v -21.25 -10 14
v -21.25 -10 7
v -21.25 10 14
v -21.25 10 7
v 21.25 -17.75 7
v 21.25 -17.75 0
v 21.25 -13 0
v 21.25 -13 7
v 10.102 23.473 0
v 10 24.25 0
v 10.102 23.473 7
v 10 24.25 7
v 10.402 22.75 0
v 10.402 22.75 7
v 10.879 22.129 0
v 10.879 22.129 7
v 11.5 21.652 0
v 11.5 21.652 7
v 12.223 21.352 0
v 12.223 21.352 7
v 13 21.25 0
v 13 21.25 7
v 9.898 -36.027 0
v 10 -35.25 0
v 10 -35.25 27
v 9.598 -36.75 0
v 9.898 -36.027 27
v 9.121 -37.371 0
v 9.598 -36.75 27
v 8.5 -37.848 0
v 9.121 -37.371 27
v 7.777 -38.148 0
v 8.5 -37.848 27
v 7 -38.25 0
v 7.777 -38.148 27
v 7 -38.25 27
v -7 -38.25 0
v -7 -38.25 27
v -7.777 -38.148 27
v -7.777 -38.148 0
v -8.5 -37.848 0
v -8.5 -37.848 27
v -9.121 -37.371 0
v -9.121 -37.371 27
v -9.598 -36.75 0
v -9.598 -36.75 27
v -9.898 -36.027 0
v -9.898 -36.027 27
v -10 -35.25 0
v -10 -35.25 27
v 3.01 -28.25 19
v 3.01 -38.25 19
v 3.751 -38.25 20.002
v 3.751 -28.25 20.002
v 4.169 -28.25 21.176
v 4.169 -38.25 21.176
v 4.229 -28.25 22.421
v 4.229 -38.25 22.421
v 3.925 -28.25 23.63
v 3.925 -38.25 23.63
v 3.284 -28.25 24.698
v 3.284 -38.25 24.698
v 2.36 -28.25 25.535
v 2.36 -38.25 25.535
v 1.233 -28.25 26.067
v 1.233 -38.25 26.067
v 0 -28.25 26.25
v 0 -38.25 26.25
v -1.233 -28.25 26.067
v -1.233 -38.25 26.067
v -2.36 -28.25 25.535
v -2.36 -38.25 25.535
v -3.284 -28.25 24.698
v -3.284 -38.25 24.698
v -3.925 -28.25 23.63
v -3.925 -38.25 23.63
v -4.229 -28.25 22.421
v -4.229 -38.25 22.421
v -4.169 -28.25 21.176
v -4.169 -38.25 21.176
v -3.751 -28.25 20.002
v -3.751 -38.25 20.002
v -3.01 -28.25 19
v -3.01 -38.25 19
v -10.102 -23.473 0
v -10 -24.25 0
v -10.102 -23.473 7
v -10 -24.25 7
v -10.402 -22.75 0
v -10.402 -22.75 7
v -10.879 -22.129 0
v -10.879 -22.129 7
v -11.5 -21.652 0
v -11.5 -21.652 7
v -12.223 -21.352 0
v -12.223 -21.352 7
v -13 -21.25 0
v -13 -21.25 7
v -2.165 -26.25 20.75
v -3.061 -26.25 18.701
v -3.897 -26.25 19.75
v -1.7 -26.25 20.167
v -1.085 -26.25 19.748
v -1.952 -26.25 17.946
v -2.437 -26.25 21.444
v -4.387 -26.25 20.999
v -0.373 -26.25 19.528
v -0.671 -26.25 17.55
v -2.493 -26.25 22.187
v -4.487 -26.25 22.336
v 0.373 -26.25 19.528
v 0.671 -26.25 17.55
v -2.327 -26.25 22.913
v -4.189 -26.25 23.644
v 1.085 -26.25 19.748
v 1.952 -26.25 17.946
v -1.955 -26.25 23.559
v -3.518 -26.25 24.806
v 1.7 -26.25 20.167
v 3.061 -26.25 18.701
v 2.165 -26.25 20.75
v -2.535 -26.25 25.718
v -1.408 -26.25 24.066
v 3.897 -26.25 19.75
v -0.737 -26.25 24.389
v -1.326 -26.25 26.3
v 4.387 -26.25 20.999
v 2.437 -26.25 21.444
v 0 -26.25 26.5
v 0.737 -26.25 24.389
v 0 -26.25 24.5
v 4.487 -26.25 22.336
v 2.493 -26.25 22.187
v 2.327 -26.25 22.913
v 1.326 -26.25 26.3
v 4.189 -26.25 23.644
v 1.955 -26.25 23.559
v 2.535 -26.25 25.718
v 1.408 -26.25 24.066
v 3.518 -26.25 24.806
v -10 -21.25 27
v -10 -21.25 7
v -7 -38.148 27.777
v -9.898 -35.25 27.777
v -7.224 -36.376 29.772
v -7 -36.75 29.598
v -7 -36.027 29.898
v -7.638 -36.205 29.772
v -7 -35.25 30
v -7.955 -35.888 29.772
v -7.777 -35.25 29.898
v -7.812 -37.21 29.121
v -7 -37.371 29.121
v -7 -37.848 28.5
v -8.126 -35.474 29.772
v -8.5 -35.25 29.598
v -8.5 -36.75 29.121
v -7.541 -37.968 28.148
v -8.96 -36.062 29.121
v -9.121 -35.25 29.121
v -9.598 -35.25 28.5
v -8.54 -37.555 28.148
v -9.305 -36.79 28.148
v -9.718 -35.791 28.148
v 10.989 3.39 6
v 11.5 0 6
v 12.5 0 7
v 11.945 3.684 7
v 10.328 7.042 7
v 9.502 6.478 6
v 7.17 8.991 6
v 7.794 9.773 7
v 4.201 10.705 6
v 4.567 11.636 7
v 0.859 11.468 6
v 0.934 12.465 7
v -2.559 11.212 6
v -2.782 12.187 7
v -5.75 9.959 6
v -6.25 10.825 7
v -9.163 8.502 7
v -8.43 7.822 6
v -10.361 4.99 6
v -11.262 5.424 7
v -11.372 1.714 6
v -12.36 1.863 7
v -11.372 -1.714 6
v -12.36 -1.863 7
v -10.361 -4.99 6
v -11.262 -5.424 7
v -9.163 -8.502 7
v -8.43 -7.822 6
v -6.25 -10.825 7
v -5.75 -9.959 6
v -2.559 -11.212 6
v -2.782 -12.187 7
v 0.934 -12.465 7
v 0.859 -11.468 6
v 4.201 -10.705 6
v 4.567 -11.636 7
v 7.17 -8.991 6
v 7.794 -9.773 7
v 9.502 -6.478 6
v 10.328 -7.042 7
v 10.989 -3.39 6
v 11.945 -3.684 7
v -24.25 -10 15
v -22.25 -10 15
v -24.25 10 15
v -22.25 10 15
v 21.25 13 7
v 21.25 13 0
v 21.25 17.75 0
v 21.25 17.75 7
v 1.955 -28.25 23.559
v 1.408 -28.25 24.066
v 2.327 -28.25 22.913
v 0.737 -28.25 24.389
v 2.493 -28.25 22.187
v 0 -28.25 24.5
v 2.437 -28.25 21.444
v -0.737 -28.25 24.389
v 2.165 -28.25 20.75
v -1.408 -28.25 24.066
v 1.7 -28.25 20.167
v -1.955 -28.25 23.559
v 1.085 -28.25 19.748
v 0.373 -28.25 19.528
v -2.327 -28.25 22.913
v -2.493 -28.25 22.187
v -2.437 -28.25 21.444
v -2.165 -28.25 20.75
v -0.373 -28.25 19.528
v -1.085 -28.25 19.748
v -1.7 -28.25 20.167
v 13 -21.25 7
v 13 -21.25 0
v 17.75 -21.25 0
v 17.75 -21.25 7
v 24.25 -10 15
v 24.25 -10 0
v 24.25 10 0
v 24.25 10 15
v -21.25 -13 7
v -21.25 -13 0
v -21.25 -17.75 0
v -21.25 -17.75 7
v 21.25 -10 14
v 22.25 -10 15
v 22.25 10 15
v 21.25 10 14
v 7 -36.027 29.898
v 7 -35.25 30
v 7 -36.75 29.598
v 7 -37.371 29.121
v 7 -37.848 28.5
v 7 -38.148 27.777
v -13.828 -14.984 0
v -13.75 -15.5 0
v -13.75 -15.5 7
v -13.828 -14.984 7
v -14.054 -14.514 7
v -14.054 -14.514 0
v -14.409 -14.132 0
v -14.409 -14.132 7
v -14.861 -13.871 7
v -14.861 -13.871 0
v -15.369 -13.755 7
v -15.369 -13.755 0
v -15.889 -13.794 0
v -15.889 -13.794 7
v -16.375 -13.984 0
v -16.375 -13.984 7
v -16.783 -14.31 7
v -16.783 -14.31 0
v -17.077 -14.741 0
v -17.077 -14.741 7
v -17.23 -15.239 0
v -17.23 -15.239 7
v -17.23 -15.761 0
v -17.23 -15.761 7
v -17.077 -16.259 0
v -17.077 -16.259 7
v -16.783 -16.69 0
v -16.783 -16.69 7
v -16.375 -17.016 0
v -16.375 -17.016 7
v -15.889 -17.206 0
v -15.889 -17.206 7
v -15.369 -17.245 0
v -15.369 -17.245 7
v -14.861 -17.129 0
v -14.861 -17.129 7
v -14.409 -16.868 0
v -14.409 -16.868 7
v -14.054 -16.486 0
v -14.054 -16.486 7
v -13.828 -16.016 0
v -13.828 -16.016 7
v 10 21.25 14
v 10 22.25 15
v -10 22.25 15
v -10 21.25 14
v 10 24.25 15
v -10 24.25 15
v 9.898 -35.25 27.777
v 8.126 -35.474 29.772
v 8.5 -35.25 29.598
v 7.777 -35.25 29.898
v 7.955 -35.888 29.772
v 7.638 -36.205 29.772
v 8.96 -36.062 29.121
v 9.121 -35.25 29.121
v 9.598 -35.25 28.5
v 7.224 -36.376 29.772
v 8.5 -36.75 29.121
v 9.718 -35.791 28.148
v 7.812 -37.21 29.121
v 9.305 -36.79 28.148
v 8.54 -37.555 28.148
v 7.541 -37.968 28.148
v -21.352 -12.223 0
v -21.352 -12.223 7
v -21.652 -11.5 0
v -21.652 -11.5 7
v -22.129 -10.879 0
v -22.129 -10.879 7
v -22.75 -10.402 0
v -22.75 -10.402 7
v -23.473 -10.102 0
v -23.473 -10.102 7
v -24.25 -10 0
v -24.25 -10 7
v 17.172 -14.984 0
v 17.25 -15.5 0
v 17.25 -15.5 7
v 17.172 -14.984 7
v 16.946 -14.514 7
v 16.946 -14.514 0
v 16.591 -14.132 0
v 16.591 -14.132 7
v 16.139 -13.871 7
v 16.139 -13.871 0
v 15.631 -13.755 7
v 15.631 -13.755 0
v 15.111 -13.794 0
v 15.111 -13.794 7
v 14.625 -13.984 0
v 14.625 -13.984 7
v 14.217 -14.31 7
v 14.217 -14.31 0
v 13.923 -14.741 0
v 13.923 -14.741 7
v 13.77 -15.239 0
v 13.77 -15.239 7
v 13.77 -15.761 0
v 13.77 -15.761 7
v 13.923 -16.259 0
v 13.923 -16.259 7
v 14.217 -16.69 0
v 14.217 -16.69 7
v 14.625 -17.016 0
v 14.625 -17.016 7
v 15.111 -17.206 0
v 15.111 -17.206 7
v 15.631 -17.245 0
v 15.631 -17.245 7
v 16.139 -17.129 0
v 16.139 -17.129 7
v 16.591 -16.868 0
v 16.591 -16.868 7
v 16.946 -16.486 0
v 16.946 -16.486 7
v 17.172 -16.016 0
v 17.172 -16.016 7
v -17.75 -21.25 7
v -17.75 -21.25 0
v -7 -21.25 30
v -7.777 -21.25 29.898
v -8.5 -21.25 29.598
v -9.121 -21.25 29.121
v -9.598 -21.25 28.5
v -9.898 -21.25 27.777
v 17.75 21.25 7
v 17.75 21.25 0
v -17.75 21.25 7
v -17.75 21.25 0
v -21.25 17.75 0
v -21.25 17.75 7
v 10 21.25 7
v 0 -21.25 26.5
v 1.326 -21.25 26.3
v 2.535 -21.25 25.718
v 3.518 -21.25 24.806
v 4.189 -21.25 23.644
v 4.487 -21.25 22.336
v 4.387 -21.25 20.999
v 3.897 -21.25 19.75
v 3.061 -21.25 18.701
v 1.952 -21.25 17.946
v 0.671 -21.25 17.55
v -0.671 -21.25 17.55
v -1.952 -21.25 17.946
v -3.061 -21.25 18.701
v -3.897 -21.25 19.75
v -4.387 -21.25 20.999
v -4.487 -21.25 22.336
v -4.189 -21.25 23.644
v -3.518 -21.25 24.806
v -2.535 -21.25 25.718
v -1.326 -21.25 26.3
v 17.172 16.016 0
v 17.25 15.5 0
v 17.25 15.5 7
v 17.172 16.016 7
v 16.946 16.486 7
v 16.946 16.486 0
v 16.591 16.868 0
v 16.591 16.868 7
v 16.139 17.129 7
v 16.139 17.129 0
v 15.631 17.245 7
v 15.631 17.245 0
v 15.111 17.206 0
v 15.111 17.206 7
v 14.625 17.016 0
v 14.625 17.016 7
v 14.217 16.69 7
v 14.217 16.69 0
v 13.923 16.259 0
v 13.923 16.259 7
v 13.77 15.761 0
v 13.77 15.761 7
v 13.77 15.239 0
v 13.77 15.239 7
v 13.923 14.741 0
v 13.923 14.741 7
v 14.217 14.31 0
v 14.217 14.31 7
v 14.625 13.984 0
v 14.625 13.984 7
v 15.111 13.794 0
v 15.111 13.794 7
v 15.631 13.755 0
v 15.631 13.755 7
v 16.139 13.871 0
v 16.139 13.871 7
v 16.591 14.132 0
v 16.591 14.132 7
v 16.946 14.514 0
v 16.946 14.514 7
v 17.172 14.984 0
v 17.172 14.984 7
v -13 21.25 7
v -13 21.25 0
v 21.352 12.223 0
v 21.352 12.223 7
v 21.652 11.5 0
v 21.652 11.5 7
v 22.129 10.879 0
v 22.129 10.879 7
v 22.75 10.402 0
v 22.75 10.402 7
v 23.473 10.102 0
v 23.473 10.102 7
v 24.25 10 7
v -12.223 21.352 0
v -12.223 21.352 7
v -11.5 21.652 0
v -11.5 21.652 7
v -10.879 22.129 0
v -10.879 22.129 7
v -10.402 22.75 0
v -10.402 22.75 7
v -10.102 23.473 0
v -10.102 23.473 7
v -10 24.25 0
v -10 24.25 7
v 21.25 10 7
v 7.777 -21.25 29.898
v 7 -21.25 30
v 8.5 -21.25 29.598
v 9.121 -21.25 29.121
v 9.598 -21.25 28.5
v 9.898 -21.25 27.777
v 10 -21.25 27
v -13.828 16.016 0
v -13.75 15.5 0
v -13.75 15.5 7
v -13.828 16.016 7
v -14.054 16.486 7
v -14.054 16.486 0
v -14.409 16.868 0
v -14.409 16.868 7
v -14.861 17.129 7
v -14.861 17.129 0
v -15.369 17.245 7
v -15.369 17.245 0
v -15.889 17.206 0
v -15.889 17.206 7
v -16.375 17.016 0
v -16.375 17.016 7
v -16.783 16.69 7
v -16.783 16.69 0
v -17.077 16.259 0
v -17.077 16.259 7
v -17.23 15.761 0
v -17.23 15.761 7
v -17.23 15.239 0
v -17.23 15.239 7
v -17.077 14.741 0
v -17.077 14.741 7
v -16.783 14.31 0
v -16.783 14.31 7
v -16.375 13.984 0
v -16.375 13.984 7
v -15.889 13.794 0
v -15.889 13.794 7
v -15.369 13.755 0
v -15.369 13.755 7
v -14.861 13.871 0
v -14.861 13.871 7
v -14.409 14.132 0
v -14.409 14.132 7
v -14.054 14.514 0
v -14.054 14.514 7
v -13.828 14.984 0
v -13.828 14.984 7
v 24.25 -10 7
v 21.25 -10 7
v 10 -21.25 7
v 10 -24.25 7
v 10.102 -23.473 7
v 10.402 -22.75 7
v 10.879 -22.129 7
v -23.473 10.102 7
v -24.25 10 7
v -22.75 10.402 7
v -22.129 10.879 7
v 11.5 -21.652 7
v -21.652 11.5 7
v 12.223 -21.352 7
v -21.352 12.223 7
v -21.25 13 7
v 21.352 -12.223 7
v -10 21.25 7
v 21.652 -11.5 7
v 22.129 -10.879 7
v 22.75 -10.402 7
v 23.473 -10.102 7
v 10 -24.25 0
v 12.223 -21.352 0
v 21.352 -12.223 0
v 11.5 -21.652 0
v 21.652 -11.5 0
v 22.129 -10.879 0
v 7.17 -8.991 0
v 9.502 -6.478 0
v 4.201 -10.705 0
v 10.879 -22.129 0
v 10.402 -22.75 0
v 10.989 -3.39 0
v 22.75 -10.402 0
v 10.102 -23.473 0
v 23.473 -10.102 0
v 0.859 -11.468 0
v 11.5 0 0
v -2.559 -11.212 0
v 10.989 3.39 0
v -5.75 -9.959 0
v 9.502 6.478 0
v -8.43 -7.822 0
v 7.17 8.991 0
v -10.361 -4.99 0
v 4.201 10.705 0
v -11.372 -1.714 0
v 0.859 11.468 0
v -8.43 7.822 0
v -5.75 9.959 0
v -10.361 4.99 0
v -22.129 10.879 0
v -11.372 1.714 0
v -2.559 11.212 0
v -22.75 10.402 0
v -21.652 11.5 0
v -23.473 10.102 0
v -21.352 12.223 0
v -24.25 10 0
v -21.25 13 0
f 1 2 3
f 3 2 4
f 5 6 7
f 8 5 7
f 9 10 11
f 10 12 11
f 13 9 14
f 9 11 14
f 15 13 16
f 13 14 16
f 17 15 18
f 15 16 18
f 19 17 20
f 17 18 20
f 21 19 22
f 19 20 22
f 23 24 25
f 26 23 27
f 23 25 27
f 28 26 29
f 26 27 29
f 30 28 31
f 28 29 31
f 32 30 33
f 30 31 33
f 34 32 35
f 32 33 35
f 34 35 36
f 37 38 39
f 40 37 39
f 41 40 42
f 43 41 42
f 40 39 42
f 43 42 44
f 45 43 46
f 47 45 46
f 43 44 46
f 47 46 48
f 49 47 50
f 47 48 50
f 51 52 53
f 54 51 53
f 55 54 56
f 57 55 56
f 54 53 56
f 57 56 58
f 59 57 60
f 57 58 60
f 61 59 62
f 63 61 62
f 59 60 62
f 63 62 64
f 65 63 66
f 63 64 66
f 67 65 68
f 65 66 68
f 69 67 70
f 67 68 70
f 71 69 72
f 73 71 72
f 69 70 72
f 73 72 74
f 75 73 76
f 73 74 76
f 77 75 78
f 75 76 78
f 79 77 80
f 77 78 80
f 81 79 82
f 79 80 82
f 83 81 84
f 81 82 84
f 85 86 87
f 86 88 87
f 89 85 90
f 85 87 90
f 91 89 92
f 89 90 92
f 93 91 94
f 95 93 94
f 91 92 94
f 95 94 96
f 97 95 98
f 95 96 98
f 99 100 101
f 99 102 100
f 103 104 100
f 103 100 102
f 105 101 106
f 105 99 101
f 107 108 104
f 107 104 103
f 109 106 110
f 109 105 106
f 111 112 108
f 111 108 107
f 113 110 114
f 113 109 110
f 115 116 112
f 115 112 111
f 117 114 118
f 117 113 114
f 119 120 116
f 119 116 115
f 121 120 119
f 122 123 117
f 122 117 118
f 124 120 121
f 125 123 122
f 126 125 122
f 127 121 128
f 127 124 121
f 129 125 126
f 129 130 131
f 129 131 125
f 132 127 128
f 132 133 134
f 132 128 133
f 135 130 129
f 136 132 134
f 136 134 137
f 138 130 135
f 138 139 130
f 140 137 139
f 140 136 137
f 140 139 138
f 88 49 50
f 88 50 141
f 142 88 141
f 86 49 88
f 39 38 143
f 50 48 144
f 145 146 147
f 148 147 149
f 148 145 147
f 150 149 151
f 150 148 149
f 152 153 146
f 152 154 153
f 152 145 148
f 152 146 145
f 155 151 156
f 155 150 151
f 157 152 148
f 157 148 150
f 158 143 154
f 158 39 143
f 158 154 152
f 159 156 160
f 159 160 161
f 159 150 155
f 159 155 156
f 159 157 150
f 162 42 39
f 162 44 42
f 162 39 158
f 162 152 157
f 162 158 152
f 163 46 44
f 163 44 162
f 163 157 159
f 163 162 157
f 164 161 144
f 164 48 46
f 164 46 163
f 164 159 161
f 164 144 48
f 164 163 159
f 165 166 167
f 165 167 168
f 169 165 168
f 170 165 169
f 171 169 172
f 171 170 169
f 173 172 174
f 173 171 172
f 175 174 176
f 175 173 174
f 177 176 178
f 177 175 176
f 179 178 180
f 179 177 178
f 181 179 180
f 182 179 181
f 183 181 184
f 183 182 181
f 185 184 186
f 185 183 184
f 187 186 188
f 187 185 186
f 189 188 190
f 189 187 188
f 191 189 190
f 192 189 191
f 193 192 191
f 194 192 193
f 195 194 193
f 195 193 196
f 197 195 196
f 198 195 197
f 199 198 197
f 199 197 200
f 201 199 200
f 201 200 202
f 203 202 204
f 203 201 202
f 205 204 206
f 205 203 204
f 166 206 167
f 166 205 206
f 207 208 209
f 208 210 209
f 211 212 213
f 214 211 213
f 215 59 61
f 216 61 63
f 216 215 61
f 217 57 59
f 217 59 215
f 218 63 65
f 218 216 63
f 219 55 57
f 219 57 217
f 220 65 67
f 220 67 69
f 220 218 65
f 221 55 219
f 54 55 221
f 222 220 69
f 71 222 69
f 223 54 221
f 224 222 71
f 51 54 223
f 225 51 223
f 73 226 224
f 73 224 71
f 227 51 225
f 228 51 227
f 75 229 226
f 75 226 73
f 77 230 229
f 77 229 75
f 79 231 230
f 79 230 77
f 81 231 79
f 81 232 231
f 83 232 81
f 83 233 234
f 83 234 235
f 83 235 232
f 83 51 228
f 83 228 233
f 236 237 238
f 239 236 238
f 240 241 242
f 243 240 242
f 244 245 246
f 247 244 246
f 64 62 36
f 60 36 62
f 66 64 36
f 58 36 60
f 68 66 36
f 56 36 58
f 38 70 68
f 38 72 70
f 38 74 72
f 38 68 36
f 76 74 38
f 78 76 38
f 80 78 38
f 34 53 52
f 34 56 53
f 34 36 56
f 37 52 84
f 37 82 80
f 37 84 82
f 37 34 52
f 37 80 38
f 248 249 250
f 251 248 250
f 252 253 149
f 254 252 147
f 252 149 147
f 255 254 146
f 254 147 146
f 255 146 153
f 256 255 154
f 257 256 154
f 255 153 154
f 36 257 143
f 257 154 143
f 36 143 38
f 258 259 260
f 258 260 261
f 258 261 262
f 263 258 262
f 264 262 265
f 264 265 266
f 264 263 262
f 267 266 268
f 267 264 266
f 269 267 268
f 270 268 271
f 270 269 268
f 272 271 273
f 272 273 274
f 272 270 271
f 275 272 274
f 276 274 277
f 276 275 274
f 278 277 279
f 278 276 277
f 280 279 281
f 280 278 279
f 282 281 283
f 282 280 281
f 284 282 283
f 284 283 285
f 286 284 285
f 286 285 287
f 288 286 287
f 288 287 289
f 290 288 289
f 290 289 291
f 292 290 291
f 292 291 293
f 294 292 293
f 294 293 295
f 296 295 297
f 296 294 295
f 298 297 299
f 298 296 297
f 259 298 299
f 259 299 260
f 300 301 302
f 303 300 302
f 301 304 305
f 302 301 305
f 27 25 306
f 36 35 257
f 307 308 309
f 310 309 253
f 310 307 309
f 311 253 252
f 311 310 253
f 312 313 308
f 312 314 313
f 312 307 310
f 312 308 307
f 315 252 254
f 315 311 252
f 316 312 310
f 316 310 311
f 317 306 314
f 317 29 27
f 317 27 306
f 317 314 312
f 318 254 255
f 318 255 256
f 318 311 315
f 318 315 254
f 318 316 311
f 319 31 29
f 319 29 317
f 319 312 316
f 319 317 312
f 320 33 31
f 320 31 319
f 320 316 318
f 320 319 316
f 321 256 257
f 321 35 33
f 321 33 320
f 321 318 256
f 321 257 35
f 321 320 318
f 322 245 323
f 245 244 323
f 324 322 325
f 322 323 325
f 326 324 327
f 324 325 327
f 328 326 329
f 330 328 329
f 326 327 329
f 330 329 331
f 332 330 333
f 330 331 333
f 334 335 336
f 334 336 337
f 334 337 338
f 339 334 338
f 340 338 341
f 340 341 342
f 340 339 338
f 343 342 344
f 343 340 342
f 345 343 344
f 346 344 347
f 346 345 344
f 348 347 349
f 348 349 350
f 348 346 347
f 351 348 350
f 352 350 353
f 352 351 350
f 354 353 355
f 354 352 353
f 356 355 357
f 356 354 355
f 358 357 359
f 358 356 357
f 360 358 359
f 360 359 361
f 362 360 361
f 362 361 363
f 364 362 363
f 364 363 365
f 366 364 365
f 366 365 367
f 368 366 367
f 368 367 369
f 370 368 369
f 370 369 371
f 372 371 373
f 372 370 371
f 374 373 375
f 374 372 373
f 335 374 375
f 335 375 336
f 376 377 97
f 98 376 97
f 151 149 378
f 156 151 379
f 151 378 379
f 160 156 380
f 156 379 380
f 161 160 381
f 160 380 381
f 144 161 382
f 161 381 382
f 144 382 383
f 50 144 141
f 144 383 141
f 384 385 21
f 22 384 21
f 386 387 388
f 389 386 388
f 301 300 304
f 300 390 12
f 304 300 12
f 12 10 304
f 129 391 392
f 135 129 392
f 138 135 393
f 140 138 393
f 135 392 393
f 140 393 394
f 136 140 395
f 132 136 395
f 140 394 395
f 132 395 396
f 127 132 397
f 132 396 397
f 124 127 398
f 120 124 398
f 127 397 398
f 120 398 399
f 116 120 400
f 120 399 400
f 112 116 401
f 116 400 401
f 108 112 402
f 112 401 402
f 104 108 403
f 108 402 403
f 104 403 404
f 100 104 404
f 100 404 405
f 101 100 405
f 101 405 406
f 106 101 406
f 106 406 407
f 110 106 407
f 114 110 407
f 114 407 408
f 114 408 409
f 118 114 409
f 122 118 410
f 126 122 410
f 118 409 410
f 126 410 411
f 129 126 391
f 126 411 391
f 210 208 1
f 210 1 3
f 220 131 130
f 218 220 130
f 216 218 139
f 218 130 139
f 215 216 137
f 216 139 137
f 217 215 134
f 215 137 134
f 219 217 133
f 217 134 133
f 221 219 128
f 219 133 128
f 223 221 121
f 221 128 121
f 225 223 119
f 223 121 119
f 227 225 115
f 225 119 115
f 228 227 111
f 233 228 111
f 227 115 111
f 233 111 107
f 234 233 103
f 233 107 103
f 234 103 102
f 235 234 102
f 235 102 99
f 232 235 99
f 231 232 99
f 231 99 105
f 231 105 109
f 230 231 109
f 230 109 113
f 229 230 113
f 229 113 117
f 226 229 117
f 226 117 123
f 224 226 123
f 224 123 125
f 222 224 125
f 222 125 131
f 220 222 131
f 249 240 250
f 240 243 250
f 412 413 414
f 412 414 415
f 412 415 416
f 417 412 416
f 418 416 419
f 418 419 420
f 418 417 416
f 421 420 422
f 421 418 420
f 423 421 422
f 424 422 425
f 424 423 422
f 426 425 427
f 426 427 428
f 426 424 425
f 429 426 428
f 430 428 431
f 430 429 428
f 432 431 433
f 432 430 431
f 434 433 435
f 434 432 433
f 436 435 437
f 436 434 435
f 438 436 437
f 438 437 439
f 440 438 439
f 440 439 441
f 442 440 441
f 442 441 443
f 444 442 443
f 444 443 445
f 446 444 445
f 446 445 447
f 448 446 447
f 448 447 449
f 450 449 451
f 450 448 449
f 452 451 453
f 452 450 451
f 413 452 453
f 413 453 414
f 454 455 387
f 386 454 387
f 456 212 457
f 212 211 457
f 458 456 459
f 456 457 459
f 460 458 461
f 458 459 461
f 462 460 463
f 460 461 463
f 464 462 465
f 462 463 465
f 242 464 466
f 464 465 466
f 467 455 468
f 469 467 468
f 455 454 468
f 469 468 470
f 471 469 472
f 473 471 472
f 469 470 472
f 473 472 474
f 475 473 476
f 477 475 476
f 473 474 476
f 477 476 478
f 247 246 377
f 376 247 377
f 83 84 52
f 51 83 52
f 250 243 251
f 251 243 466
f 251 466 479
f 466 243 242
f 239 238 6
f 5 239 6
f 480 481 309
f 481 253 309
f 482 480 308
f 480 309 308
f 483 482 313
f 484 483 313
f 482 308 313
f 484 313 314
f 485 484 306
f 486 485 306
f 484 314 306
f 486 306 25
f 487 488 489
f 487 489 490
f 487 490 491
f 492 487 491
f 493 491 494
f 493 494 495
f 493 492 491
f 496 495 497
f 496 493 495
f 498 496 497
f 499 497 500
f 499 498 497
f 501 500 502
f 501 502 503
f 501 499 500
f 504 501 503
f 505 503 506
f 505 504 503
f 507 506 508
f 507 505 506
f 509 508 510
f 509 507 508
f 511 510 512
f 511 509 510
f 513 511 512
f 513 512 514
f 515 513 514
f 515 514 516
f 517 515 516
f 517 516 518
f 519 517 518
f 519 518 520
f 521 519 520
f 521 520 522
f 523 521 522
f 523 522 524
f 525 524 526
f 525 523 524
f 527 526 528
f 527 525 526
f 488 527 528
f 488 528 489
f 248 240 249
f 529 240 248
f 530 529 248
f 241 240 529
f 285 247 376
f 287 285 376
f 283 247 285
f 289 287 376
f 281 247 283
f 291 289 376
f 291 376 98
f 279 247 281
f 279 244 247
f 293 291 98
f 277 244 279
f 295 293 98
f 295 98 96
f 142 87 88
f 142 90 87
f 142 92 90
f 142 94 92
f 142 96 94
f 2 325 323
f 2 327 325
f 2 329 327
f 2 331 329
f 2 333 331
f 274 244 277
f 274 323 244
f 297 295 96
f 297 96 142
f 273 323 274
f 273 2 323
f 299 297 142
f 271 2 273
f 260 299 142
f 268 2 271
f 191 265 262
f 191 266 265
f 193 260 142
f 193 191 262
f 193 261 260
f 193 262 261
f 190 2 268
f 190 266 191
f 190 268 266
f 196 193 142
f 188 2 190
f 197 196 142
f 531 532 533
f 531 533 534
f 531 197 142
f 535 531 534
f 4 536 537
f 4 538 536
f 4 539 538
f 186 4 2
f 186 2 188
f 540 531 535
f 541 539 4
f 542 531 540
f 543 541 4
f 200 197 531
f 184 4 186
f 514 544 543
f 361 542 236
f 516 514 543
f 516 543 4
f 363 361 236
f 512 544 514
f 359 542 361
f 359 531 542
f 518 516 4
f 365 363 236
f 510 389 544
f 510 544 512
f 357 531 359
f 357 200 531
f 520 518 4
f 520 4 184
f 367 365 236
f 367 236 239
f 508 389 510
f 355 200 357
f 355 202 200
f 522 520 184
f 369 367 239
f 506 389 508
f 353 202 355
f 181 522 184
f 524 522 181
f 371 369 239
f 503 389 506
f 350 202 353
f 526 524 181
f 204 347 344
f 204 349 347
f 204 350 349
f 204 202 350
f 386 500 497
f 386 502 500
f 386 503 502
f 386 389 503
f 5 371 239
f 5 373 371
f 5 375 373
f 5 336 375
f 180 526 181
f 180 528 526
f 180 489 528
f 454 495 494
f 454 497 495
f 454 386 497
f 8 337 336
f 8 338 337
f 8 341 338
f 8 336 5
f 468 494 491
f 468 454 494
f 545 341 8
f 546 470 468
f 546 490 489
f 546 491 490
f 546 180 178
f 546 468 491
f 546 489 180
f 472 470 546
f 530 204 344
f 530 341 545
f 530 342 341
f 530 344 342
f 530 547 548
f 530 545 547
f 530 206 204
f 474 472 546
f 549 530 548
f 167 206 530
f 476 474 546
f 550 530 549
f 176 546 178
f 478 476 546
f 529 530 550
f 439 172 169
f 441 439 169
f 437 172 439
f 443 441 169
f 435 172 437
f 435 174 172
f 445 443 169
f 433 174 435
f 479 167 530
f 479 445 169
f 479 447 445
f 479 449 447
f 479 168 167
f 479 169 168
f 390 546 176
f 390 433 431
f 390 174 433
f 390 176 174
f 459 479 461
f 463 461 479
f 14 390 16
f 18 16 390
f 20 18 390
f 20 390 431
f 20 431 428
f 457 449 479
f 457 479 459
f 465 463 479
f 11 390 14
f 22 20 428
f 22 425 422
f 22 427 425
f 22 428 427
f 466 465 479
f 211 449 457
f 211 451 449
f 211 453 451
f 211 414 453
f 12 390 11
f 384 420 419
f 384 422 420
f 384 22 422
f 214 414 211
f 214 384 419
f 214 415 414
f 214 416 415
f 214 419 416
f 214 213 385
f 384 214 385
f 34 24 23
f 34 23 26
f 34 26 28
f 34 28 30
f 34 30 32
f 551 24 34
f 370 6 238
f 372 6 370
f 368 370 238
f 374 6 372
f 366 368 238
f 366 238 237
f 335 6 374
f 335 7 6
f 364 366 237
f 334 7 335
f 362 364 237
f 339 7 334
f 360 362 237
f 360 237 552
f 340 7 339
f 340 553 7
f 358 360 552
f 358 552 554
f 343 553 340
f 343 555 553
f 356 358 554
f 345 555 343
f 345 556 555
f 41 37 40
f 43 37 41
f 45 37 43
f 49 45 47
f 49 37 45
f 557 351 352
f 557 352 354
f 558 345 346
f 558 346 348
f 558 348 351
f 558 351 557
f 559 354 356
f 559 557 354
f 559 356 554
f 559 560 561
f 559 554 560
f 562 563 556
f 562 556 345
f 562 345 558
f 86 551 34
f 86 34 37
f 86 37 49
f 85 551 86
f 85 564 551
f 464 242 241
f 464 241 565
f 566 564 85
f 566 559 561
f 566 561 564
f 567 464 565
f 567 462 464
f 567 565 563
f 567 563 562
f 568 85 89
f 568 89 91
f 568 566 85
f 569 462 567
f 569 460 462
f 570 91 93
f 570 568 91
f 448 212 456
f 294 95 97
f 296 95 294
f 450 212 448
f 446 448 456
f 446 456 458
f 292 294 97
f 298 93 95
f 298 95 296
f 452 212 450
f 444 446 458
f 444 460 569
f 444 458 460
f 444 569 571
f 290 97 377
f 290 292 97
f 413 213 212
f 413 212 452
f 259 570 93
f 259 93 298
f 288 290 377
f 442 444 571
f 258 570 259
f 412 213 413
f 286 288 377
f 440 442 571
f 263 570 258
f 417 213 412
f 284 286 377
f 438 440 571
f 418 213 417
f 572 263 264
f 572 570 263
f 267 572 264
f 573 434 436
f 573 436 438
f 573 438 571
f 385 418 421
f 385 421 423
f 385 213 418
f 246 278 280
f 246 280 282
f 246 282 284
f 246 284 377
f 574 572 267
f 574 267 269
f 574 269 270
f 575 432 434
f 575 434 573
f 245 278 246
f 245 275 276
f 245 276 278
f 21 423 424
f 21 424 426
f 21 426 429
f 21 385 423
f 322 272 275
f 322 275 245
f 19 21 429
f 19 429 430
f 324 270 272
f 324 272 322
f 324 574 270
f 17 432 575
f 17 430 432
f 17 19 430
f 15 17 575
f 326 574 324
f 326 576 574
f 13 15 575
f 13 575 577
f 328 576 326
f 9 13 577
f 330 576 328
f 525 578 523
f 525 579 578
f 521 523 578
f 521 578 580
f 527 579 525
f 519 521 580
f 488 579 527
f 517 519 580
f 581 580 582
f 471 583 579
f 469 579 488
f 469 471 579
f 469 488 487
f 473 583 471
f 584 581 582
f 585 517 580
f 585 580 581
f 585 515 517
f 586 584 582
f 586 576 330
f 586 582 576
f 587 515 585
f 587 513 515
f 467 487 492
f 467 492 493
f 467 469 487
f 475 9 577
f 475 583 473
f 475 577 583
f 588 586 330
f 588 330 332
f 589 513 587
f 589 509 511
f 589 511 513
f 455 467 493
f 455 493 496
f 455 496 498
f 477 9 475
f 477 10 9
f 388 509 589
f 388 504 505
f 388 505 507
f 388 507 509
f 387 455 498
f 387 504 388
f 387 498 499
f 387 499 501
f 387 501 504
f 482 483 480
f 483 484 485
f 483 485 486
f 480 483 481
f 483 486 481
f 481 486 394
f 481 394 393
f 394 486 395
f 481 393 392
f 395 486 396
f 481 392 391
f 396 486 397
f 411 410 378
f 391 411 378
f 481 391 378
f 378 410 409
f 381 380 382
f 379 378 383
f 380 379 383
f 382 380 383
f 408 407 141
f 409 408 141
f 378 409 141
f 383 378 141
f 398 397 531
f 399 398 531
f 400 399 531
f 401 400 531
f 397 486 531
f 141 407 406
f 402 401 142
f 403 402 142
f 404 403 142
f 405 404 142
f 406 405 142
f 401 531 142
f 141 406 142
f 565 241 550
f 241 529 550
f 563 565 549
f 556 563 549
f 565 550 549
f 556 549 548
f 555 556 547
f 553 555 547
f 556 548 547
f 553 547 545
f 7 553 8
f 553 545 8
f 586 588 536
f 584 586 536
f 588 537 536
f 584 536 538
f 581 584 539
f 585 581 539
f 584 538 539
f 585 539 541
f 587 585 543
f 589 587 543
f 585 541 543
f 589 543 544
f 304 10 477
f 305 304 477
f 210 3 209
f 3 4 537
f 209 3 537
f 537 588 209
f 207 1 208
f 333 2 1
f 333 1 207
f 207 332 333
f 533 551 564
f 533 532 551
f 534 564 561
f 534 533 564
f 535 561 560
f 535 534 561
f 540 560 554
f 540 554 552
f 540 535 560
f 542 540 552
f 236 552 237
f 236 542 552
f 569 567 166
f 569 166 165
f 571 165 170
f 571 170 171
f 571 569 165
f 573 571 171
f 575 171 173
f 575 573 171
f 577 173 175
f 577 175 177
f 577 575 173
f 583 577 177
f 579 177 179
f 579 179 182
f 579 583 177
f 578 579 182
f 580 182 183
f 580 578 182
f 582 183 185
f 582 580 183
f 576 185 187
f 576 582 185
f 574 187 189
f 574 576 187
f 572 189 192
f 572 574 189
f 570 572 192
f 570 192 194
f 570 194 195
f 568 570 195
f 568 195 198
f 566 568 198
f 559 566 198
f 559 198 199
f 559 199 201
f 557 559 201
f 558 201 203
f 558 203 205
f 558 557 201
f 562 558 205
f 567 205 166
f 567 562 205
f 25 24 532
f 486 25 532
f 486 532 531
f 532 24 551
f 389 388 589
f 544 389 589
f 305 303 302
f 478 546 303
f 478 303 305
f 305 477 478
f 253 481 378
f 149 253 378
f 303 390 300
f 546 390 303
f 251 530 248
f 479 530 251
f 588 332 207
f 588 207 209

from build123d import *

# Parameters (mm, degrees)
ESQUISSE1_R             = 11.5
ESQUISSE1_R_2           = 1.75
BOSS_EXTRU_1_DEPTH      = 7
ESQUISSE2_W             = 20
ESQUISSE2_H             = 3
ESQUISSE2_W_2           = 3
ESQUISSE2_H_2           = 20
BOSS_EXTRU_2_DEPTH      = 15
ESQUISSE3_W             = 20
ESQUISSE3_H             = 17
BOSS_EXTRU_3_DEPTH      = 30
ESQUISSE4_R             = 2.5
ENL_V_MAT_EXTRU_1_DEPTH = 60.651592602
ESQUISSE5_R             = 4.5
ENL_V_MAT_EXTRU_2_DEPTH = 5
ENL_V_MAT_EXTRU_3_DEPTH = 10
CONG_1_R                = 3
CONG_2_R                = 3
CHANFREIN1_SIZE         = 1


with BuildPart() as part:
    # Esquisse1 → Boss.-Extru.1 (new body)
    with BuildSketch(Plane.XY):
        Polygon((-17.749999999, 21.249999999), (-21.249999999, 17.749999999), (-21.249999999, -17.749999999), (-17.749999999, -21.250000001), (17.749999999, -21.250000001), (21.249999999, -17.749999999), (21.249999999, 17.749999999), (17.749999999, 21.249999999), align=None)
        Circle(ESQUISSE1_R, mode=Mode.SUBTRACT)
        with Locations((-15.5, 15.5)):
            Circle(ESQUISSE1_R_2, mode=Mode.SUBTRACT)
        with Locations((15.5, 15.5)):
            Circle(ESQUISSE1_R_2, mode=Mode.SUBTRACT)
        with Locations((15.5, -15.5)):
            Circle(ESQUISSE1_R_2, mode=Mode.SUBTRACT)
        with Locations((-15.5, -15.5)):
            Circle(ESQUISSE1_R_2, mode=Mode.SUBTRACT)
    extrude(amount=BOSS_EXTRU_1_DEPTH)

    # Esquisse2 → Boss.-Extru.2 (add)
    with BuildSketch(Plane(origin=(0, 0, 0), x_dir=(-1, 0, 0), z_dir=(0, 0, -1))):
        with Locations((0, 22.749999999)):
            Rectangle(ESQUISSE2_W, ESQUISSE2_H)
        with Locations((22.749999999, 0)):
            Rectangle(ESQUISSE2_W_2, ESQUISSE2_H_2)
        with Locations((-22.749999999, 0)):
            Rectangle(ESQUISSE2_W_2, ESQUISSE2_H_2)
    extrude(amount=-BOSS_EXTRU_2_DEPTH)

    # Esquisse3 → Boss.-Extru.3 (add)
    with BuildSketch(Plane(origin=(0, 0, 0), x_dir=(-1, 0, 0), z_dir=(0, 0, -1))):
        with Locations((0, -29.750000001)):
            Rectangle(ESQUISSE3_W, ESQUISSE3_H)
    extrude(amount=-BOSS_EXTRU_3_DEPTH)

    # Esquisse4 → Enlèv. mat.-Extru.1 (cut, through all)
    with BuildSketch(Plane(origin=(0, -21.250000001, 0), x_dir=(1, 0, 0), z_dir=(0, 1, 0))):
        with Locations(Location((0, -22, 0), (0, 0, 270))):
            Circle(ESQUISSE4_R)
    extrude(amount=-ENL_V_MAT_EXTRU_1_DEPTH, mode=Mode.SUBTRACT)

    # Esquisse5 → Enlèv. mat.-Extru.2 (cut)
    with BuildSketch(Plane(origin=(0, -21.250000001, 0), x_dir=(1, 0, 0), z_dir=(0, 1, 0))):
        with Locations(Location((0, -22, 0), (0, 0, 270))):
            Circle(ESQUISSE5_R)
    extrude(amount=-ENL_V_MAT_EXTRU_2_DEPTH, mode=Mode.SUBTRACT)

    # Esquisse6 → Enlèv. mat.-Extru.3 (cut)
    with BuildSketch(Plane(origin=(0, -38.250000001, 0), x_dir=(-1, 0, 0), z_dir=(0, -1, 0))):
        with BuildLine():
            Line((3.010398645, -19), (-3.010398645, -19))
            ThreePointArc((-3.010398645, -19), (0, -26.25), (3.010398645, -19))
        make_face()
    extrude(amount=-ENL_V_MAT_EXTRU_3_DEPTH, mode=Mode.SUBTRACT)

    # Congé1
    cong_1_edges = [part.edges().sort_by_distance(p)[0] for p in [
        (-21.249999999, -10, 3.5),
        (-21.249999999, 10, 3.5),
        (-10, 21.249999999, 3.5),
        (10, 21.249999999, 3.5),
        (21.249999999, 10, 3.5),
        (21.249999999, -10, 3.5),
        (-10, -38.250000001, 15),
        (10, -38.250000001, 15),
        (10, -21.250000001, 3.5),
        (-10, -21.250000001, 3.5),
    ]]
    fillet(cong_1_edges, radius=CONG_1_R - 0.0001)  # a hair under: the kernel refuses the full size

    # Congé2
    cong_2_edges = [part.edges().sort_by_distance(p)[0] for p in [
        (-10, -28.250050001, 30),
        (0, -38.250000001, 30),
        (9.121349633, -37.371349634, 30),
        (-9.121349633, -37.371349634, 30),
        (10, -28.250050001, 30),
    ]]
    fillet(cong_2_edges, radius=CONG_2_R - 0.0001)  # a hair under: the kernel refuses the full size

    # Chanfrein1
    chanfrein1_edges = [part.edges().sort_by_distance(p)[0] for p in [
        (-11.5, 0, 7),
        (0, 21.249999999, 15),
        (-21.249999999, 0, 15),
        (21.249999999, 0, 15),
    ]]
    chamfer(chanfrein1_edges, length=CHANFREIN1_SIZE)


solid = part.part
